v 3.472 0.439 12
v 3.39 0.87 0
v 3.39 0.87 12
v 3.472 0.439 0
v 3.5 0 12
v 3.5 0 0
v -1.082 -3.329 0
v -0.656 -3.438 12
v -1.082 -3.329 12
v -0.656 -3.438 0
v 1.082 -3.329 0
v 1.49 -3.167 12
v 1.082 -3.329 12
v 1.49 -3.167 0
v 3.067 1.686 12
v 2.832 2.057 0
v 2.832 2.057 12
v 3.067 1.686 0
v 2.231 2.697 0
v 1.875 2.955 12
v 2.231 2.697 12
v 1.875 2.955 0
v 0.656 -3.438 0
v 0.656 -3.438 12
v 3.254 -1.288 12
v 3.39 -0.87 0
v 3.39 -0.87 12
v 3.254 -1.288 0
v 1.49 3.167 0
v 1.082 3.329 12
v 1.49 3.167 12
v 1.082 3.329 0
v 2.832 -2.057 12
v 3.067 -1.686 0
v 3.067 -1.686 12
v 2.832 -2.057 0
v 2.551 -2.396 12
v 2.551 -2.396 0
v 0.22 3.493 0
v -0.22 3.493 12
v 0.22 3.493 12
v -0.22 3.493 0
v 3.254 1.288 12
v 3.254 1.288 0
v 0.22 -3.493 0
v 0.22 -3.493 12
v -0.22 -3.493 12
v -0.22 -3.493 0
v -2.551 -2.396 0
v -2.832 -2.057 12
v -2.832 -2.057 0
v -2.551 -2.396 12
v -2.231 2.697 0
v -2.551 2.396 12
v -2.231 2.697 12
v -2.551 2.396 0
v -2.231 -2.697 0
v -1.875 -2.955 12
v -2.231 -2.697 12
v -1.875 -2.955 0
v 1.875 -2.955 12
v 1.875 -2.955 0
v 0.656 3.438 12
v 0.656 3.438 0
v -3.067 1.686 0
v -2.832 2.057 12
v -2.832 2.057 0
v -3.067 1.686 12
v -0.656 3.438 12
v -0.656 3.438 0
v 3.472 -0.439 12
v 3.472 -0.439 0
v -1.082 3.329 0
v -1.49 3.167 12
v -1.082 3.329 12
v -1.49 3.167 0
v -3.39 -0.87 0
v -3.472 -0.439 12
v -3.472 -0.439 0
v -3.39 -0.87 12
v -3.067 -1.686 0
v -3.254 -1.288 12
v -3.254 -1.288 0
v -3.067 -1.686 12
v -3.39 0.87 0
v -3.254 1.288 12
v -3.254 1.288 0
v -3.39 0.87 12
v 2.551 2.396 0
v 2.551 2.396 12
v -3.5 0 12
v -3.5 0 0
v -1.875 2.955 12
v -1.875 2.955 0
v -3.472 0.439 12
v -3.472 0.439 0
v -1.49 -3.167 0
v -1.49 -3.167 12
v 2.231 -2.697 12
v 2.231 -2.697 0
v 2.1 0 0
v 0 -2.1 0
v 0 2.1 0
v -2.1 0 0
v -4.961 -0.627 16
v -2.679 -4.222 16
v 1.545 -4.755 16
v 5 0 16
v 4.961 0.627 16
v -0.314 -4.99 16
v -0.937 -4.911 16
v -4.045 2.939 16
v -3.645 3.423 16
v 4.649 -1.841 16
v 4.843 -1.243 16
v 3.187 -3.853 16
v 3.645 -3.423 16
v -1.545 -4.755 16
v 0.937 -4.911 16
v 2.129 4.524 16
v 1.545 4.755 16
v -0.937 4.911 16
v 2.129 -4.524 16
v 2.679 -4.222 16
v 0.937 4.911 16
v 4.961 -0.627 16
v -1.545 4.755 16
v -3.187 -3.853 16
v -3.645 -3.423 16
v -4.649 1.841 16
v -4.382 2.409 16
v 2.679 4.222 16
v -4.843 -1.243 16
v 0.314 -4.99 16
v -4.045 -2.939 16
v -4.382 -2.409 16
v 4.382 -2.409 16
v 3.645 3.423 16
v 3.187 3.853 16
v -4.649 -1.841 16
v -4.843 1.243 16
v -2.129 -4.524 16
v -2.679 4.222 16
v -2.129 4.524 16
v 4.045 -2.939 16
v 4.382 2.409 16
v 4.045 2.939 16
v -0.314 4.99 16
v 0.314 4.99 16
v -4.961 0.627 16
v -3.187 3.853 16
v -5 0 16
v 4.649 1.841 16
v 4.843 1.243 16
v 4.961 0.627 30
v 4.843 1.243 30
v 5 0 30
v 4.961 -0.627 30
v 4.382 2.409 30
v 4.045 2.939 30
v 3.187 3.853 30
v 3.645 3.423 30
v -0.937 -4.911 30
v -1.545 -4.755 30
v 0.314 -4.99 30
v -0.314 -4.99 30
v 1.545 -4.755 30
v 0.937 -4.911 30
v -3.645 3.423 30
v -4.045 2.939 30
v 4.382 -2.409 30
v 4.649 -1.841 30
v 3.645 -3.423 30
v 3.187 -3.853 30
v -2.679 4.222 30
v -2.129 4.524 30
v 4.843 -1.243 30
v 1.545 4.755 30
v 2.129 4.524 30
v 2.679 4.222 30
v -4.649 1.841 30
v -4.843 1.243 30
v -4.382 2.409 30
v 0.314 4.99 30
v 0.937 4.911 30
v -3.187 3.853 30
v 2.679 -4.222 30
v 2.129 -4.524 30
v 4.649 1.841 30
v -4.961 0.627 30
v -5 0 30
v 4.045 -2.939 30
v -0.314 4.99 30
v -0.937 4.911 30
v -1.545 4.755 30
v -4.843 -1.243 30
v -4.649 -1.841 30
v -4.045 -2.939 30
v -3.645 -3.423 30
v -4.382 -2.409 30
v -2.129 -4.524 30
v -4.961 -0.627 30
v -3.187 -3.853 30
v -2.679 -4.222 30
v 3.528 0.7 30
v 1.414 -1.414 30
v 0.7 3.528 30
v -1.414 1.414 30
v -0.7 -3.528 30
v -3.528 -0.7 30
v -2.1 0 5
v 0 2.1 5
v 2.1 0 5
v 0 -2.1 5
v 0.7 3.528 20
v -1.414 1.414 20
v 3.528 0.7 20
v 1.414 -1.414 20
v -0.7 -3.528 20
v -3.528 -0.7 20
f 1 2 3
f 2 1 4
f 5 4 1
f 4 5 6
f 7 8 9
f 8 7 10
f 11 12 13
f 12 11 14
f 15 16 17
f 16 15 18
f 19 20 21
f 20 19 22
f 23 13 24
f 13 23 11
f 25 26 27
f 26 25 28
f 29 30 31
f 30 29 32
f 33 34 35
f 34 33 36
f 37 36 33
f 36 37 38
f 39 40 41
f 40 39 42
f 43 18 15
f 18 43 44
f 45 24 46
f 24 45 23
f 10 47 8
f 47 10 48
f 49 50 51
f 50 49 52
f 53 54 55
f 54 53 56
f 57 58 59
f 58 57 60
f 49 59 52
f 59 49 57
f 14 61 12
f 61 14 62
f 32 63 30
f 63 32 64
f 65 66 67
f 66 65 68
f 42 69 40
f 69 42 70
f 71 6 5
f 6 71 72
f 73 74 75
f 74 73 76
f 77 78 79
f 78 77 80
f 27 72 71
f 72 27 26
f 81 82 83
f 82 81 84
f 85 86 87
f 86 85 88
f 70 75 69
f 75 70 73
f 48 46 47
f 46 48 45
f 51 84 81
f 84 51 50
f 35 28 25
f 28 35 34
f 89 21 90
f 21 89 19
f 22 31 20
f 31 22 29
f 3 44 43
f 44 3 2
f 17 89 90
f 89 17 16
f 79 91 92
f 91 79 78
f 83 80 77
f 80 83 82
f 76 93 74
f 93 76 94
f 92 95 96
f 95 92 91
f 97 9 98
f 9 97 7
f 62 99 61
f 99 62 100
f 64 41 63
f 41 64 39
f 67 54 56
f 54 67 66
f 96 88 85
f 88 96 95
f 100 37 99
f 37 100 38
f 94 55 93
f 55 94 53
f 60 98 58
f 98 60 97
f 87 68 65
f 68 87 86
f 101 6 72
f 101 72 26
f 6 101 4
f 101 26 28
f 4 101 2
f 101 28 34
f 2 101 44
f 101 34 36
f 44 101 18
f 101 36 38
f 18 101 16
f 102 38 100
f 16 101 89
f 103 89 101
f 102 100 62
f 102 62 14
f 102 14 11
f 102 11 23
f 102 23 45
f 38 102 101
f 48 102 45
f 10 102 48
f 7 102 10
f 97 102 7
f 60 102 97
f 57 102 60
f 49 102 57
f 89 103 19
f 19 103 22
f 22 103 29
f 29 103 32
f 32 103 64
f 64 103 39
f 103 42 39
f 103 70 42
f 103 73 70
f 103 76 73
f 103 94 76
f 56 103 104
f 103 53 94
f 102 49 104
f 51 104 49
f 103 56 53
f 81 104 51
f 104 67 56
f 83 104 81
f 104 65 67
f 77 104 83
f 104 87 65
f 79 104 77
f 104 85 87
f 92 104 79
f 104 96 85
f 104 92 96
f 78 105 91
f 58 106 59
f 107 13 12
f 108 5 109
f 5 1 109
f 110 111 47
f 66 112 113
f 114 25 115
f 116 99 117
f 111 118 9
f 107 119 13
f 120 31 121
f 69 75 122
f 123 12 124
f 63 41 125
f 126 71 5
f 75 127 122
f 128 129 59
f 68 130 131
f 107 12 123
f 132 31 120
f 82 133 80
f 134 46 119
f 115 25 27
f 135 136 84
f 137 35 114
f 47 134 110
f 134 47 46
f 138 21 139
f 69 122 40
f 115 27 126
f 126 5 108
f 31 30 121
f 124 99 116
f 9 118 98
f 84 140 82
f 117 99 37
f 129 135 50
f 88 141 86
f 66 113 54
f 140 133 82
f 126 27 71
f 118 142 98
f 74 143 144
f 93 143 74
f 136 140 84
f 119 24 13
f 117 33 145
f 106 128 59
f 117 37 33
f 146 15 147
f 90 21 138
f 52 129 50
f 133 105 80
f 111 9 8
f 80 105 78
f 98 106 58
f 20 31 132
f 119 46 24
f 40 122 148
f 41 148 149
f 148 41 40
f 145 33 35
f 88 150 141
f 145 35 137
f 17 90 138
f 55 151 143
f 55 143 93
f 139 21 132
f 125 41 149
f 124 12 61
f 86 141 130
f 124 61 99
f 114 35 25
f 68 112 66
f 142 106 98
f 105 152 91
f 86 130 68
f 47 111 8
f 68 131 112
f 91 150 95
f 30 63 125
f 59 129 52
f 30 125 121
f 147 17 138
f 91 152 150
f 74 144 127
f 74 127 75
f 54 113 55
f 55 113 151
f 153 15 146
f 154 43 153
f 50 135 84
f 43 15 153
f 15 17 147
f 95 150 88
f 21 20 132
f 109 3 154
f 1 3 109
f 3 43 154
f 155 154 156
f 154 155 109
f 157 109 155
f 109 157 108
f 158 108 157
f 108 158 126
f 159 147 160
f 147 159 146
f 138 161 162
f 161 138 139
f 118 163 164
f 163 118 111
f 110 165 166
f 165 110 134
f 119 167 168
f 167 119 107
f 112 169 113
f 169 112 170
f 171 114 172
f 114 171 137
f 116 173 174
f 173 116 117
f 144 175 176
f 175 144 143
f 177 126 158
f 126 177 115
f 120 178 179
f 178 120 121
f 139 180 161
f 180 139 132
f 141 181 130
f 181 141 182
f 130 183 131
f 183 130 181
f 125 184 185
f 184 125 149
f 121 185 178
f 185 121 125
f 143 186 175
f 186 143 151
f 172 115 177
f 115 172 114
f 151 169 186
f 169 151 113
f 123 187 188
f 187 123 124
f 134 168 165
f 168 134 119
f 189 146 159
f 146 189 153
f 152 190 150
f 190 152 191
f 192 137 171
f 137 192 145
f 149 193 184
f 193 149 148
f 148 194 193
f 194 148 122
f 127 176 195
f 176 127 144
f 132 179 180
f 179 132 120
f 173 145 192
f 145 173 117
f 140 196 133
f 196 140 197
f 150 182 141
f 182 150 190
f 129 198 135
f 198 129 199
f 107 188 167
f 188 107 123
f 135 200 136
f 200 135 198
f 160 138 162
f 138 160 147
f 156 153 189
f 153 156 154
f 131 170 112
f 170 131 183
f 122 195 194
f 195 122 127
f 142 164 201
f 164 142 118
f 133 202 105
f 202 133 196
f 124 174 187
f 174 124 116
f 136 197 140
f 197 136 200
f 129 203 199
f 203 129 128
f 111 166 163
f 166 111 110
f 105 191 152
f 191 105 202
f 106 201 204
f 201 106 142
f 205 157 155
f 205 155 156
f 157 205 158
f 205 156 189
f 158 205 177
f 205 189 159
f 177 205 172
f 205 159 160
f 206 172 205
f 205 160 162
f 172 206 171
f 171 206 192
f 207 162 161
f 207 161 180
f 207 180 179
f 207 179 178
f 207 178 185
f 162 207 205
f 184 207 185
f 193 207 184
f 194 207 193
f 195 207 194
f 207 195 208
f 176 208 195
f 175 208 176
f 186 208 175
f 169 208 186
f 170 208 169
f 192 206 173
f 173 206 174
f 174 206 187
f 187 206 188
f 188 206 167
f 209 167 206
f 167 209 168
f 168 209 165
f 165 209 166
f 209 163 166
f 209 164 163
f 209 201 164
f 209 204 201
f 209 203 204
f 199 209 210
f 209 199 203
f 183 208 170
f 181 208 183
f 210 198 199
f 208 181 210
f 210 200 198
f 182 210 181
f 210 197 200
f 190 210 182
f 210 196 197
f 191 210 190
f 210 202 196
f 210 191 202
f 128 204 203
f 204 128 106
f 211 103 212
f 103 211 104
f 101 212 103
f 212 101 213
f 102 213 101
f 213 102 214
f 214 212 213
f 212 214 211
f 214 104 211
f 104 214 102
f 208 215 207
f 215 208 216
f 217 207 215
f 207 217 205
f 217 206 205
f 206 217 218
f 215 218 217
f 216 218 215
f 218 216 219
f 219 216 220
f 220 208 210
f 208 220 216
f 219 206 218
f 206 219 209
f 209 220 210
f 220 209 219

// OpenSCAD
$fn = 50;

difference()
{
  union()
  {
    cylinder(d = 7, h = 12);
    translate([0,0,12]) cylinder(d1 = 7, d2 = 10, h = 4);
    translate([0,0,16]) cylinder(d = 10, h = 14);
  }
  
  translate([0,0,-1]) cylinder(d = 4.2, h = 6, $fn = 4);
  translate([0.7,0.7,20]) cylinder(d = 4*sqrt(2), h = 21, $fn = 4);
  translate([-0.7,-0.7,20]) cylinder(d = 4*sqrt(2), h = 21, $fn = 4);
  
  
}
